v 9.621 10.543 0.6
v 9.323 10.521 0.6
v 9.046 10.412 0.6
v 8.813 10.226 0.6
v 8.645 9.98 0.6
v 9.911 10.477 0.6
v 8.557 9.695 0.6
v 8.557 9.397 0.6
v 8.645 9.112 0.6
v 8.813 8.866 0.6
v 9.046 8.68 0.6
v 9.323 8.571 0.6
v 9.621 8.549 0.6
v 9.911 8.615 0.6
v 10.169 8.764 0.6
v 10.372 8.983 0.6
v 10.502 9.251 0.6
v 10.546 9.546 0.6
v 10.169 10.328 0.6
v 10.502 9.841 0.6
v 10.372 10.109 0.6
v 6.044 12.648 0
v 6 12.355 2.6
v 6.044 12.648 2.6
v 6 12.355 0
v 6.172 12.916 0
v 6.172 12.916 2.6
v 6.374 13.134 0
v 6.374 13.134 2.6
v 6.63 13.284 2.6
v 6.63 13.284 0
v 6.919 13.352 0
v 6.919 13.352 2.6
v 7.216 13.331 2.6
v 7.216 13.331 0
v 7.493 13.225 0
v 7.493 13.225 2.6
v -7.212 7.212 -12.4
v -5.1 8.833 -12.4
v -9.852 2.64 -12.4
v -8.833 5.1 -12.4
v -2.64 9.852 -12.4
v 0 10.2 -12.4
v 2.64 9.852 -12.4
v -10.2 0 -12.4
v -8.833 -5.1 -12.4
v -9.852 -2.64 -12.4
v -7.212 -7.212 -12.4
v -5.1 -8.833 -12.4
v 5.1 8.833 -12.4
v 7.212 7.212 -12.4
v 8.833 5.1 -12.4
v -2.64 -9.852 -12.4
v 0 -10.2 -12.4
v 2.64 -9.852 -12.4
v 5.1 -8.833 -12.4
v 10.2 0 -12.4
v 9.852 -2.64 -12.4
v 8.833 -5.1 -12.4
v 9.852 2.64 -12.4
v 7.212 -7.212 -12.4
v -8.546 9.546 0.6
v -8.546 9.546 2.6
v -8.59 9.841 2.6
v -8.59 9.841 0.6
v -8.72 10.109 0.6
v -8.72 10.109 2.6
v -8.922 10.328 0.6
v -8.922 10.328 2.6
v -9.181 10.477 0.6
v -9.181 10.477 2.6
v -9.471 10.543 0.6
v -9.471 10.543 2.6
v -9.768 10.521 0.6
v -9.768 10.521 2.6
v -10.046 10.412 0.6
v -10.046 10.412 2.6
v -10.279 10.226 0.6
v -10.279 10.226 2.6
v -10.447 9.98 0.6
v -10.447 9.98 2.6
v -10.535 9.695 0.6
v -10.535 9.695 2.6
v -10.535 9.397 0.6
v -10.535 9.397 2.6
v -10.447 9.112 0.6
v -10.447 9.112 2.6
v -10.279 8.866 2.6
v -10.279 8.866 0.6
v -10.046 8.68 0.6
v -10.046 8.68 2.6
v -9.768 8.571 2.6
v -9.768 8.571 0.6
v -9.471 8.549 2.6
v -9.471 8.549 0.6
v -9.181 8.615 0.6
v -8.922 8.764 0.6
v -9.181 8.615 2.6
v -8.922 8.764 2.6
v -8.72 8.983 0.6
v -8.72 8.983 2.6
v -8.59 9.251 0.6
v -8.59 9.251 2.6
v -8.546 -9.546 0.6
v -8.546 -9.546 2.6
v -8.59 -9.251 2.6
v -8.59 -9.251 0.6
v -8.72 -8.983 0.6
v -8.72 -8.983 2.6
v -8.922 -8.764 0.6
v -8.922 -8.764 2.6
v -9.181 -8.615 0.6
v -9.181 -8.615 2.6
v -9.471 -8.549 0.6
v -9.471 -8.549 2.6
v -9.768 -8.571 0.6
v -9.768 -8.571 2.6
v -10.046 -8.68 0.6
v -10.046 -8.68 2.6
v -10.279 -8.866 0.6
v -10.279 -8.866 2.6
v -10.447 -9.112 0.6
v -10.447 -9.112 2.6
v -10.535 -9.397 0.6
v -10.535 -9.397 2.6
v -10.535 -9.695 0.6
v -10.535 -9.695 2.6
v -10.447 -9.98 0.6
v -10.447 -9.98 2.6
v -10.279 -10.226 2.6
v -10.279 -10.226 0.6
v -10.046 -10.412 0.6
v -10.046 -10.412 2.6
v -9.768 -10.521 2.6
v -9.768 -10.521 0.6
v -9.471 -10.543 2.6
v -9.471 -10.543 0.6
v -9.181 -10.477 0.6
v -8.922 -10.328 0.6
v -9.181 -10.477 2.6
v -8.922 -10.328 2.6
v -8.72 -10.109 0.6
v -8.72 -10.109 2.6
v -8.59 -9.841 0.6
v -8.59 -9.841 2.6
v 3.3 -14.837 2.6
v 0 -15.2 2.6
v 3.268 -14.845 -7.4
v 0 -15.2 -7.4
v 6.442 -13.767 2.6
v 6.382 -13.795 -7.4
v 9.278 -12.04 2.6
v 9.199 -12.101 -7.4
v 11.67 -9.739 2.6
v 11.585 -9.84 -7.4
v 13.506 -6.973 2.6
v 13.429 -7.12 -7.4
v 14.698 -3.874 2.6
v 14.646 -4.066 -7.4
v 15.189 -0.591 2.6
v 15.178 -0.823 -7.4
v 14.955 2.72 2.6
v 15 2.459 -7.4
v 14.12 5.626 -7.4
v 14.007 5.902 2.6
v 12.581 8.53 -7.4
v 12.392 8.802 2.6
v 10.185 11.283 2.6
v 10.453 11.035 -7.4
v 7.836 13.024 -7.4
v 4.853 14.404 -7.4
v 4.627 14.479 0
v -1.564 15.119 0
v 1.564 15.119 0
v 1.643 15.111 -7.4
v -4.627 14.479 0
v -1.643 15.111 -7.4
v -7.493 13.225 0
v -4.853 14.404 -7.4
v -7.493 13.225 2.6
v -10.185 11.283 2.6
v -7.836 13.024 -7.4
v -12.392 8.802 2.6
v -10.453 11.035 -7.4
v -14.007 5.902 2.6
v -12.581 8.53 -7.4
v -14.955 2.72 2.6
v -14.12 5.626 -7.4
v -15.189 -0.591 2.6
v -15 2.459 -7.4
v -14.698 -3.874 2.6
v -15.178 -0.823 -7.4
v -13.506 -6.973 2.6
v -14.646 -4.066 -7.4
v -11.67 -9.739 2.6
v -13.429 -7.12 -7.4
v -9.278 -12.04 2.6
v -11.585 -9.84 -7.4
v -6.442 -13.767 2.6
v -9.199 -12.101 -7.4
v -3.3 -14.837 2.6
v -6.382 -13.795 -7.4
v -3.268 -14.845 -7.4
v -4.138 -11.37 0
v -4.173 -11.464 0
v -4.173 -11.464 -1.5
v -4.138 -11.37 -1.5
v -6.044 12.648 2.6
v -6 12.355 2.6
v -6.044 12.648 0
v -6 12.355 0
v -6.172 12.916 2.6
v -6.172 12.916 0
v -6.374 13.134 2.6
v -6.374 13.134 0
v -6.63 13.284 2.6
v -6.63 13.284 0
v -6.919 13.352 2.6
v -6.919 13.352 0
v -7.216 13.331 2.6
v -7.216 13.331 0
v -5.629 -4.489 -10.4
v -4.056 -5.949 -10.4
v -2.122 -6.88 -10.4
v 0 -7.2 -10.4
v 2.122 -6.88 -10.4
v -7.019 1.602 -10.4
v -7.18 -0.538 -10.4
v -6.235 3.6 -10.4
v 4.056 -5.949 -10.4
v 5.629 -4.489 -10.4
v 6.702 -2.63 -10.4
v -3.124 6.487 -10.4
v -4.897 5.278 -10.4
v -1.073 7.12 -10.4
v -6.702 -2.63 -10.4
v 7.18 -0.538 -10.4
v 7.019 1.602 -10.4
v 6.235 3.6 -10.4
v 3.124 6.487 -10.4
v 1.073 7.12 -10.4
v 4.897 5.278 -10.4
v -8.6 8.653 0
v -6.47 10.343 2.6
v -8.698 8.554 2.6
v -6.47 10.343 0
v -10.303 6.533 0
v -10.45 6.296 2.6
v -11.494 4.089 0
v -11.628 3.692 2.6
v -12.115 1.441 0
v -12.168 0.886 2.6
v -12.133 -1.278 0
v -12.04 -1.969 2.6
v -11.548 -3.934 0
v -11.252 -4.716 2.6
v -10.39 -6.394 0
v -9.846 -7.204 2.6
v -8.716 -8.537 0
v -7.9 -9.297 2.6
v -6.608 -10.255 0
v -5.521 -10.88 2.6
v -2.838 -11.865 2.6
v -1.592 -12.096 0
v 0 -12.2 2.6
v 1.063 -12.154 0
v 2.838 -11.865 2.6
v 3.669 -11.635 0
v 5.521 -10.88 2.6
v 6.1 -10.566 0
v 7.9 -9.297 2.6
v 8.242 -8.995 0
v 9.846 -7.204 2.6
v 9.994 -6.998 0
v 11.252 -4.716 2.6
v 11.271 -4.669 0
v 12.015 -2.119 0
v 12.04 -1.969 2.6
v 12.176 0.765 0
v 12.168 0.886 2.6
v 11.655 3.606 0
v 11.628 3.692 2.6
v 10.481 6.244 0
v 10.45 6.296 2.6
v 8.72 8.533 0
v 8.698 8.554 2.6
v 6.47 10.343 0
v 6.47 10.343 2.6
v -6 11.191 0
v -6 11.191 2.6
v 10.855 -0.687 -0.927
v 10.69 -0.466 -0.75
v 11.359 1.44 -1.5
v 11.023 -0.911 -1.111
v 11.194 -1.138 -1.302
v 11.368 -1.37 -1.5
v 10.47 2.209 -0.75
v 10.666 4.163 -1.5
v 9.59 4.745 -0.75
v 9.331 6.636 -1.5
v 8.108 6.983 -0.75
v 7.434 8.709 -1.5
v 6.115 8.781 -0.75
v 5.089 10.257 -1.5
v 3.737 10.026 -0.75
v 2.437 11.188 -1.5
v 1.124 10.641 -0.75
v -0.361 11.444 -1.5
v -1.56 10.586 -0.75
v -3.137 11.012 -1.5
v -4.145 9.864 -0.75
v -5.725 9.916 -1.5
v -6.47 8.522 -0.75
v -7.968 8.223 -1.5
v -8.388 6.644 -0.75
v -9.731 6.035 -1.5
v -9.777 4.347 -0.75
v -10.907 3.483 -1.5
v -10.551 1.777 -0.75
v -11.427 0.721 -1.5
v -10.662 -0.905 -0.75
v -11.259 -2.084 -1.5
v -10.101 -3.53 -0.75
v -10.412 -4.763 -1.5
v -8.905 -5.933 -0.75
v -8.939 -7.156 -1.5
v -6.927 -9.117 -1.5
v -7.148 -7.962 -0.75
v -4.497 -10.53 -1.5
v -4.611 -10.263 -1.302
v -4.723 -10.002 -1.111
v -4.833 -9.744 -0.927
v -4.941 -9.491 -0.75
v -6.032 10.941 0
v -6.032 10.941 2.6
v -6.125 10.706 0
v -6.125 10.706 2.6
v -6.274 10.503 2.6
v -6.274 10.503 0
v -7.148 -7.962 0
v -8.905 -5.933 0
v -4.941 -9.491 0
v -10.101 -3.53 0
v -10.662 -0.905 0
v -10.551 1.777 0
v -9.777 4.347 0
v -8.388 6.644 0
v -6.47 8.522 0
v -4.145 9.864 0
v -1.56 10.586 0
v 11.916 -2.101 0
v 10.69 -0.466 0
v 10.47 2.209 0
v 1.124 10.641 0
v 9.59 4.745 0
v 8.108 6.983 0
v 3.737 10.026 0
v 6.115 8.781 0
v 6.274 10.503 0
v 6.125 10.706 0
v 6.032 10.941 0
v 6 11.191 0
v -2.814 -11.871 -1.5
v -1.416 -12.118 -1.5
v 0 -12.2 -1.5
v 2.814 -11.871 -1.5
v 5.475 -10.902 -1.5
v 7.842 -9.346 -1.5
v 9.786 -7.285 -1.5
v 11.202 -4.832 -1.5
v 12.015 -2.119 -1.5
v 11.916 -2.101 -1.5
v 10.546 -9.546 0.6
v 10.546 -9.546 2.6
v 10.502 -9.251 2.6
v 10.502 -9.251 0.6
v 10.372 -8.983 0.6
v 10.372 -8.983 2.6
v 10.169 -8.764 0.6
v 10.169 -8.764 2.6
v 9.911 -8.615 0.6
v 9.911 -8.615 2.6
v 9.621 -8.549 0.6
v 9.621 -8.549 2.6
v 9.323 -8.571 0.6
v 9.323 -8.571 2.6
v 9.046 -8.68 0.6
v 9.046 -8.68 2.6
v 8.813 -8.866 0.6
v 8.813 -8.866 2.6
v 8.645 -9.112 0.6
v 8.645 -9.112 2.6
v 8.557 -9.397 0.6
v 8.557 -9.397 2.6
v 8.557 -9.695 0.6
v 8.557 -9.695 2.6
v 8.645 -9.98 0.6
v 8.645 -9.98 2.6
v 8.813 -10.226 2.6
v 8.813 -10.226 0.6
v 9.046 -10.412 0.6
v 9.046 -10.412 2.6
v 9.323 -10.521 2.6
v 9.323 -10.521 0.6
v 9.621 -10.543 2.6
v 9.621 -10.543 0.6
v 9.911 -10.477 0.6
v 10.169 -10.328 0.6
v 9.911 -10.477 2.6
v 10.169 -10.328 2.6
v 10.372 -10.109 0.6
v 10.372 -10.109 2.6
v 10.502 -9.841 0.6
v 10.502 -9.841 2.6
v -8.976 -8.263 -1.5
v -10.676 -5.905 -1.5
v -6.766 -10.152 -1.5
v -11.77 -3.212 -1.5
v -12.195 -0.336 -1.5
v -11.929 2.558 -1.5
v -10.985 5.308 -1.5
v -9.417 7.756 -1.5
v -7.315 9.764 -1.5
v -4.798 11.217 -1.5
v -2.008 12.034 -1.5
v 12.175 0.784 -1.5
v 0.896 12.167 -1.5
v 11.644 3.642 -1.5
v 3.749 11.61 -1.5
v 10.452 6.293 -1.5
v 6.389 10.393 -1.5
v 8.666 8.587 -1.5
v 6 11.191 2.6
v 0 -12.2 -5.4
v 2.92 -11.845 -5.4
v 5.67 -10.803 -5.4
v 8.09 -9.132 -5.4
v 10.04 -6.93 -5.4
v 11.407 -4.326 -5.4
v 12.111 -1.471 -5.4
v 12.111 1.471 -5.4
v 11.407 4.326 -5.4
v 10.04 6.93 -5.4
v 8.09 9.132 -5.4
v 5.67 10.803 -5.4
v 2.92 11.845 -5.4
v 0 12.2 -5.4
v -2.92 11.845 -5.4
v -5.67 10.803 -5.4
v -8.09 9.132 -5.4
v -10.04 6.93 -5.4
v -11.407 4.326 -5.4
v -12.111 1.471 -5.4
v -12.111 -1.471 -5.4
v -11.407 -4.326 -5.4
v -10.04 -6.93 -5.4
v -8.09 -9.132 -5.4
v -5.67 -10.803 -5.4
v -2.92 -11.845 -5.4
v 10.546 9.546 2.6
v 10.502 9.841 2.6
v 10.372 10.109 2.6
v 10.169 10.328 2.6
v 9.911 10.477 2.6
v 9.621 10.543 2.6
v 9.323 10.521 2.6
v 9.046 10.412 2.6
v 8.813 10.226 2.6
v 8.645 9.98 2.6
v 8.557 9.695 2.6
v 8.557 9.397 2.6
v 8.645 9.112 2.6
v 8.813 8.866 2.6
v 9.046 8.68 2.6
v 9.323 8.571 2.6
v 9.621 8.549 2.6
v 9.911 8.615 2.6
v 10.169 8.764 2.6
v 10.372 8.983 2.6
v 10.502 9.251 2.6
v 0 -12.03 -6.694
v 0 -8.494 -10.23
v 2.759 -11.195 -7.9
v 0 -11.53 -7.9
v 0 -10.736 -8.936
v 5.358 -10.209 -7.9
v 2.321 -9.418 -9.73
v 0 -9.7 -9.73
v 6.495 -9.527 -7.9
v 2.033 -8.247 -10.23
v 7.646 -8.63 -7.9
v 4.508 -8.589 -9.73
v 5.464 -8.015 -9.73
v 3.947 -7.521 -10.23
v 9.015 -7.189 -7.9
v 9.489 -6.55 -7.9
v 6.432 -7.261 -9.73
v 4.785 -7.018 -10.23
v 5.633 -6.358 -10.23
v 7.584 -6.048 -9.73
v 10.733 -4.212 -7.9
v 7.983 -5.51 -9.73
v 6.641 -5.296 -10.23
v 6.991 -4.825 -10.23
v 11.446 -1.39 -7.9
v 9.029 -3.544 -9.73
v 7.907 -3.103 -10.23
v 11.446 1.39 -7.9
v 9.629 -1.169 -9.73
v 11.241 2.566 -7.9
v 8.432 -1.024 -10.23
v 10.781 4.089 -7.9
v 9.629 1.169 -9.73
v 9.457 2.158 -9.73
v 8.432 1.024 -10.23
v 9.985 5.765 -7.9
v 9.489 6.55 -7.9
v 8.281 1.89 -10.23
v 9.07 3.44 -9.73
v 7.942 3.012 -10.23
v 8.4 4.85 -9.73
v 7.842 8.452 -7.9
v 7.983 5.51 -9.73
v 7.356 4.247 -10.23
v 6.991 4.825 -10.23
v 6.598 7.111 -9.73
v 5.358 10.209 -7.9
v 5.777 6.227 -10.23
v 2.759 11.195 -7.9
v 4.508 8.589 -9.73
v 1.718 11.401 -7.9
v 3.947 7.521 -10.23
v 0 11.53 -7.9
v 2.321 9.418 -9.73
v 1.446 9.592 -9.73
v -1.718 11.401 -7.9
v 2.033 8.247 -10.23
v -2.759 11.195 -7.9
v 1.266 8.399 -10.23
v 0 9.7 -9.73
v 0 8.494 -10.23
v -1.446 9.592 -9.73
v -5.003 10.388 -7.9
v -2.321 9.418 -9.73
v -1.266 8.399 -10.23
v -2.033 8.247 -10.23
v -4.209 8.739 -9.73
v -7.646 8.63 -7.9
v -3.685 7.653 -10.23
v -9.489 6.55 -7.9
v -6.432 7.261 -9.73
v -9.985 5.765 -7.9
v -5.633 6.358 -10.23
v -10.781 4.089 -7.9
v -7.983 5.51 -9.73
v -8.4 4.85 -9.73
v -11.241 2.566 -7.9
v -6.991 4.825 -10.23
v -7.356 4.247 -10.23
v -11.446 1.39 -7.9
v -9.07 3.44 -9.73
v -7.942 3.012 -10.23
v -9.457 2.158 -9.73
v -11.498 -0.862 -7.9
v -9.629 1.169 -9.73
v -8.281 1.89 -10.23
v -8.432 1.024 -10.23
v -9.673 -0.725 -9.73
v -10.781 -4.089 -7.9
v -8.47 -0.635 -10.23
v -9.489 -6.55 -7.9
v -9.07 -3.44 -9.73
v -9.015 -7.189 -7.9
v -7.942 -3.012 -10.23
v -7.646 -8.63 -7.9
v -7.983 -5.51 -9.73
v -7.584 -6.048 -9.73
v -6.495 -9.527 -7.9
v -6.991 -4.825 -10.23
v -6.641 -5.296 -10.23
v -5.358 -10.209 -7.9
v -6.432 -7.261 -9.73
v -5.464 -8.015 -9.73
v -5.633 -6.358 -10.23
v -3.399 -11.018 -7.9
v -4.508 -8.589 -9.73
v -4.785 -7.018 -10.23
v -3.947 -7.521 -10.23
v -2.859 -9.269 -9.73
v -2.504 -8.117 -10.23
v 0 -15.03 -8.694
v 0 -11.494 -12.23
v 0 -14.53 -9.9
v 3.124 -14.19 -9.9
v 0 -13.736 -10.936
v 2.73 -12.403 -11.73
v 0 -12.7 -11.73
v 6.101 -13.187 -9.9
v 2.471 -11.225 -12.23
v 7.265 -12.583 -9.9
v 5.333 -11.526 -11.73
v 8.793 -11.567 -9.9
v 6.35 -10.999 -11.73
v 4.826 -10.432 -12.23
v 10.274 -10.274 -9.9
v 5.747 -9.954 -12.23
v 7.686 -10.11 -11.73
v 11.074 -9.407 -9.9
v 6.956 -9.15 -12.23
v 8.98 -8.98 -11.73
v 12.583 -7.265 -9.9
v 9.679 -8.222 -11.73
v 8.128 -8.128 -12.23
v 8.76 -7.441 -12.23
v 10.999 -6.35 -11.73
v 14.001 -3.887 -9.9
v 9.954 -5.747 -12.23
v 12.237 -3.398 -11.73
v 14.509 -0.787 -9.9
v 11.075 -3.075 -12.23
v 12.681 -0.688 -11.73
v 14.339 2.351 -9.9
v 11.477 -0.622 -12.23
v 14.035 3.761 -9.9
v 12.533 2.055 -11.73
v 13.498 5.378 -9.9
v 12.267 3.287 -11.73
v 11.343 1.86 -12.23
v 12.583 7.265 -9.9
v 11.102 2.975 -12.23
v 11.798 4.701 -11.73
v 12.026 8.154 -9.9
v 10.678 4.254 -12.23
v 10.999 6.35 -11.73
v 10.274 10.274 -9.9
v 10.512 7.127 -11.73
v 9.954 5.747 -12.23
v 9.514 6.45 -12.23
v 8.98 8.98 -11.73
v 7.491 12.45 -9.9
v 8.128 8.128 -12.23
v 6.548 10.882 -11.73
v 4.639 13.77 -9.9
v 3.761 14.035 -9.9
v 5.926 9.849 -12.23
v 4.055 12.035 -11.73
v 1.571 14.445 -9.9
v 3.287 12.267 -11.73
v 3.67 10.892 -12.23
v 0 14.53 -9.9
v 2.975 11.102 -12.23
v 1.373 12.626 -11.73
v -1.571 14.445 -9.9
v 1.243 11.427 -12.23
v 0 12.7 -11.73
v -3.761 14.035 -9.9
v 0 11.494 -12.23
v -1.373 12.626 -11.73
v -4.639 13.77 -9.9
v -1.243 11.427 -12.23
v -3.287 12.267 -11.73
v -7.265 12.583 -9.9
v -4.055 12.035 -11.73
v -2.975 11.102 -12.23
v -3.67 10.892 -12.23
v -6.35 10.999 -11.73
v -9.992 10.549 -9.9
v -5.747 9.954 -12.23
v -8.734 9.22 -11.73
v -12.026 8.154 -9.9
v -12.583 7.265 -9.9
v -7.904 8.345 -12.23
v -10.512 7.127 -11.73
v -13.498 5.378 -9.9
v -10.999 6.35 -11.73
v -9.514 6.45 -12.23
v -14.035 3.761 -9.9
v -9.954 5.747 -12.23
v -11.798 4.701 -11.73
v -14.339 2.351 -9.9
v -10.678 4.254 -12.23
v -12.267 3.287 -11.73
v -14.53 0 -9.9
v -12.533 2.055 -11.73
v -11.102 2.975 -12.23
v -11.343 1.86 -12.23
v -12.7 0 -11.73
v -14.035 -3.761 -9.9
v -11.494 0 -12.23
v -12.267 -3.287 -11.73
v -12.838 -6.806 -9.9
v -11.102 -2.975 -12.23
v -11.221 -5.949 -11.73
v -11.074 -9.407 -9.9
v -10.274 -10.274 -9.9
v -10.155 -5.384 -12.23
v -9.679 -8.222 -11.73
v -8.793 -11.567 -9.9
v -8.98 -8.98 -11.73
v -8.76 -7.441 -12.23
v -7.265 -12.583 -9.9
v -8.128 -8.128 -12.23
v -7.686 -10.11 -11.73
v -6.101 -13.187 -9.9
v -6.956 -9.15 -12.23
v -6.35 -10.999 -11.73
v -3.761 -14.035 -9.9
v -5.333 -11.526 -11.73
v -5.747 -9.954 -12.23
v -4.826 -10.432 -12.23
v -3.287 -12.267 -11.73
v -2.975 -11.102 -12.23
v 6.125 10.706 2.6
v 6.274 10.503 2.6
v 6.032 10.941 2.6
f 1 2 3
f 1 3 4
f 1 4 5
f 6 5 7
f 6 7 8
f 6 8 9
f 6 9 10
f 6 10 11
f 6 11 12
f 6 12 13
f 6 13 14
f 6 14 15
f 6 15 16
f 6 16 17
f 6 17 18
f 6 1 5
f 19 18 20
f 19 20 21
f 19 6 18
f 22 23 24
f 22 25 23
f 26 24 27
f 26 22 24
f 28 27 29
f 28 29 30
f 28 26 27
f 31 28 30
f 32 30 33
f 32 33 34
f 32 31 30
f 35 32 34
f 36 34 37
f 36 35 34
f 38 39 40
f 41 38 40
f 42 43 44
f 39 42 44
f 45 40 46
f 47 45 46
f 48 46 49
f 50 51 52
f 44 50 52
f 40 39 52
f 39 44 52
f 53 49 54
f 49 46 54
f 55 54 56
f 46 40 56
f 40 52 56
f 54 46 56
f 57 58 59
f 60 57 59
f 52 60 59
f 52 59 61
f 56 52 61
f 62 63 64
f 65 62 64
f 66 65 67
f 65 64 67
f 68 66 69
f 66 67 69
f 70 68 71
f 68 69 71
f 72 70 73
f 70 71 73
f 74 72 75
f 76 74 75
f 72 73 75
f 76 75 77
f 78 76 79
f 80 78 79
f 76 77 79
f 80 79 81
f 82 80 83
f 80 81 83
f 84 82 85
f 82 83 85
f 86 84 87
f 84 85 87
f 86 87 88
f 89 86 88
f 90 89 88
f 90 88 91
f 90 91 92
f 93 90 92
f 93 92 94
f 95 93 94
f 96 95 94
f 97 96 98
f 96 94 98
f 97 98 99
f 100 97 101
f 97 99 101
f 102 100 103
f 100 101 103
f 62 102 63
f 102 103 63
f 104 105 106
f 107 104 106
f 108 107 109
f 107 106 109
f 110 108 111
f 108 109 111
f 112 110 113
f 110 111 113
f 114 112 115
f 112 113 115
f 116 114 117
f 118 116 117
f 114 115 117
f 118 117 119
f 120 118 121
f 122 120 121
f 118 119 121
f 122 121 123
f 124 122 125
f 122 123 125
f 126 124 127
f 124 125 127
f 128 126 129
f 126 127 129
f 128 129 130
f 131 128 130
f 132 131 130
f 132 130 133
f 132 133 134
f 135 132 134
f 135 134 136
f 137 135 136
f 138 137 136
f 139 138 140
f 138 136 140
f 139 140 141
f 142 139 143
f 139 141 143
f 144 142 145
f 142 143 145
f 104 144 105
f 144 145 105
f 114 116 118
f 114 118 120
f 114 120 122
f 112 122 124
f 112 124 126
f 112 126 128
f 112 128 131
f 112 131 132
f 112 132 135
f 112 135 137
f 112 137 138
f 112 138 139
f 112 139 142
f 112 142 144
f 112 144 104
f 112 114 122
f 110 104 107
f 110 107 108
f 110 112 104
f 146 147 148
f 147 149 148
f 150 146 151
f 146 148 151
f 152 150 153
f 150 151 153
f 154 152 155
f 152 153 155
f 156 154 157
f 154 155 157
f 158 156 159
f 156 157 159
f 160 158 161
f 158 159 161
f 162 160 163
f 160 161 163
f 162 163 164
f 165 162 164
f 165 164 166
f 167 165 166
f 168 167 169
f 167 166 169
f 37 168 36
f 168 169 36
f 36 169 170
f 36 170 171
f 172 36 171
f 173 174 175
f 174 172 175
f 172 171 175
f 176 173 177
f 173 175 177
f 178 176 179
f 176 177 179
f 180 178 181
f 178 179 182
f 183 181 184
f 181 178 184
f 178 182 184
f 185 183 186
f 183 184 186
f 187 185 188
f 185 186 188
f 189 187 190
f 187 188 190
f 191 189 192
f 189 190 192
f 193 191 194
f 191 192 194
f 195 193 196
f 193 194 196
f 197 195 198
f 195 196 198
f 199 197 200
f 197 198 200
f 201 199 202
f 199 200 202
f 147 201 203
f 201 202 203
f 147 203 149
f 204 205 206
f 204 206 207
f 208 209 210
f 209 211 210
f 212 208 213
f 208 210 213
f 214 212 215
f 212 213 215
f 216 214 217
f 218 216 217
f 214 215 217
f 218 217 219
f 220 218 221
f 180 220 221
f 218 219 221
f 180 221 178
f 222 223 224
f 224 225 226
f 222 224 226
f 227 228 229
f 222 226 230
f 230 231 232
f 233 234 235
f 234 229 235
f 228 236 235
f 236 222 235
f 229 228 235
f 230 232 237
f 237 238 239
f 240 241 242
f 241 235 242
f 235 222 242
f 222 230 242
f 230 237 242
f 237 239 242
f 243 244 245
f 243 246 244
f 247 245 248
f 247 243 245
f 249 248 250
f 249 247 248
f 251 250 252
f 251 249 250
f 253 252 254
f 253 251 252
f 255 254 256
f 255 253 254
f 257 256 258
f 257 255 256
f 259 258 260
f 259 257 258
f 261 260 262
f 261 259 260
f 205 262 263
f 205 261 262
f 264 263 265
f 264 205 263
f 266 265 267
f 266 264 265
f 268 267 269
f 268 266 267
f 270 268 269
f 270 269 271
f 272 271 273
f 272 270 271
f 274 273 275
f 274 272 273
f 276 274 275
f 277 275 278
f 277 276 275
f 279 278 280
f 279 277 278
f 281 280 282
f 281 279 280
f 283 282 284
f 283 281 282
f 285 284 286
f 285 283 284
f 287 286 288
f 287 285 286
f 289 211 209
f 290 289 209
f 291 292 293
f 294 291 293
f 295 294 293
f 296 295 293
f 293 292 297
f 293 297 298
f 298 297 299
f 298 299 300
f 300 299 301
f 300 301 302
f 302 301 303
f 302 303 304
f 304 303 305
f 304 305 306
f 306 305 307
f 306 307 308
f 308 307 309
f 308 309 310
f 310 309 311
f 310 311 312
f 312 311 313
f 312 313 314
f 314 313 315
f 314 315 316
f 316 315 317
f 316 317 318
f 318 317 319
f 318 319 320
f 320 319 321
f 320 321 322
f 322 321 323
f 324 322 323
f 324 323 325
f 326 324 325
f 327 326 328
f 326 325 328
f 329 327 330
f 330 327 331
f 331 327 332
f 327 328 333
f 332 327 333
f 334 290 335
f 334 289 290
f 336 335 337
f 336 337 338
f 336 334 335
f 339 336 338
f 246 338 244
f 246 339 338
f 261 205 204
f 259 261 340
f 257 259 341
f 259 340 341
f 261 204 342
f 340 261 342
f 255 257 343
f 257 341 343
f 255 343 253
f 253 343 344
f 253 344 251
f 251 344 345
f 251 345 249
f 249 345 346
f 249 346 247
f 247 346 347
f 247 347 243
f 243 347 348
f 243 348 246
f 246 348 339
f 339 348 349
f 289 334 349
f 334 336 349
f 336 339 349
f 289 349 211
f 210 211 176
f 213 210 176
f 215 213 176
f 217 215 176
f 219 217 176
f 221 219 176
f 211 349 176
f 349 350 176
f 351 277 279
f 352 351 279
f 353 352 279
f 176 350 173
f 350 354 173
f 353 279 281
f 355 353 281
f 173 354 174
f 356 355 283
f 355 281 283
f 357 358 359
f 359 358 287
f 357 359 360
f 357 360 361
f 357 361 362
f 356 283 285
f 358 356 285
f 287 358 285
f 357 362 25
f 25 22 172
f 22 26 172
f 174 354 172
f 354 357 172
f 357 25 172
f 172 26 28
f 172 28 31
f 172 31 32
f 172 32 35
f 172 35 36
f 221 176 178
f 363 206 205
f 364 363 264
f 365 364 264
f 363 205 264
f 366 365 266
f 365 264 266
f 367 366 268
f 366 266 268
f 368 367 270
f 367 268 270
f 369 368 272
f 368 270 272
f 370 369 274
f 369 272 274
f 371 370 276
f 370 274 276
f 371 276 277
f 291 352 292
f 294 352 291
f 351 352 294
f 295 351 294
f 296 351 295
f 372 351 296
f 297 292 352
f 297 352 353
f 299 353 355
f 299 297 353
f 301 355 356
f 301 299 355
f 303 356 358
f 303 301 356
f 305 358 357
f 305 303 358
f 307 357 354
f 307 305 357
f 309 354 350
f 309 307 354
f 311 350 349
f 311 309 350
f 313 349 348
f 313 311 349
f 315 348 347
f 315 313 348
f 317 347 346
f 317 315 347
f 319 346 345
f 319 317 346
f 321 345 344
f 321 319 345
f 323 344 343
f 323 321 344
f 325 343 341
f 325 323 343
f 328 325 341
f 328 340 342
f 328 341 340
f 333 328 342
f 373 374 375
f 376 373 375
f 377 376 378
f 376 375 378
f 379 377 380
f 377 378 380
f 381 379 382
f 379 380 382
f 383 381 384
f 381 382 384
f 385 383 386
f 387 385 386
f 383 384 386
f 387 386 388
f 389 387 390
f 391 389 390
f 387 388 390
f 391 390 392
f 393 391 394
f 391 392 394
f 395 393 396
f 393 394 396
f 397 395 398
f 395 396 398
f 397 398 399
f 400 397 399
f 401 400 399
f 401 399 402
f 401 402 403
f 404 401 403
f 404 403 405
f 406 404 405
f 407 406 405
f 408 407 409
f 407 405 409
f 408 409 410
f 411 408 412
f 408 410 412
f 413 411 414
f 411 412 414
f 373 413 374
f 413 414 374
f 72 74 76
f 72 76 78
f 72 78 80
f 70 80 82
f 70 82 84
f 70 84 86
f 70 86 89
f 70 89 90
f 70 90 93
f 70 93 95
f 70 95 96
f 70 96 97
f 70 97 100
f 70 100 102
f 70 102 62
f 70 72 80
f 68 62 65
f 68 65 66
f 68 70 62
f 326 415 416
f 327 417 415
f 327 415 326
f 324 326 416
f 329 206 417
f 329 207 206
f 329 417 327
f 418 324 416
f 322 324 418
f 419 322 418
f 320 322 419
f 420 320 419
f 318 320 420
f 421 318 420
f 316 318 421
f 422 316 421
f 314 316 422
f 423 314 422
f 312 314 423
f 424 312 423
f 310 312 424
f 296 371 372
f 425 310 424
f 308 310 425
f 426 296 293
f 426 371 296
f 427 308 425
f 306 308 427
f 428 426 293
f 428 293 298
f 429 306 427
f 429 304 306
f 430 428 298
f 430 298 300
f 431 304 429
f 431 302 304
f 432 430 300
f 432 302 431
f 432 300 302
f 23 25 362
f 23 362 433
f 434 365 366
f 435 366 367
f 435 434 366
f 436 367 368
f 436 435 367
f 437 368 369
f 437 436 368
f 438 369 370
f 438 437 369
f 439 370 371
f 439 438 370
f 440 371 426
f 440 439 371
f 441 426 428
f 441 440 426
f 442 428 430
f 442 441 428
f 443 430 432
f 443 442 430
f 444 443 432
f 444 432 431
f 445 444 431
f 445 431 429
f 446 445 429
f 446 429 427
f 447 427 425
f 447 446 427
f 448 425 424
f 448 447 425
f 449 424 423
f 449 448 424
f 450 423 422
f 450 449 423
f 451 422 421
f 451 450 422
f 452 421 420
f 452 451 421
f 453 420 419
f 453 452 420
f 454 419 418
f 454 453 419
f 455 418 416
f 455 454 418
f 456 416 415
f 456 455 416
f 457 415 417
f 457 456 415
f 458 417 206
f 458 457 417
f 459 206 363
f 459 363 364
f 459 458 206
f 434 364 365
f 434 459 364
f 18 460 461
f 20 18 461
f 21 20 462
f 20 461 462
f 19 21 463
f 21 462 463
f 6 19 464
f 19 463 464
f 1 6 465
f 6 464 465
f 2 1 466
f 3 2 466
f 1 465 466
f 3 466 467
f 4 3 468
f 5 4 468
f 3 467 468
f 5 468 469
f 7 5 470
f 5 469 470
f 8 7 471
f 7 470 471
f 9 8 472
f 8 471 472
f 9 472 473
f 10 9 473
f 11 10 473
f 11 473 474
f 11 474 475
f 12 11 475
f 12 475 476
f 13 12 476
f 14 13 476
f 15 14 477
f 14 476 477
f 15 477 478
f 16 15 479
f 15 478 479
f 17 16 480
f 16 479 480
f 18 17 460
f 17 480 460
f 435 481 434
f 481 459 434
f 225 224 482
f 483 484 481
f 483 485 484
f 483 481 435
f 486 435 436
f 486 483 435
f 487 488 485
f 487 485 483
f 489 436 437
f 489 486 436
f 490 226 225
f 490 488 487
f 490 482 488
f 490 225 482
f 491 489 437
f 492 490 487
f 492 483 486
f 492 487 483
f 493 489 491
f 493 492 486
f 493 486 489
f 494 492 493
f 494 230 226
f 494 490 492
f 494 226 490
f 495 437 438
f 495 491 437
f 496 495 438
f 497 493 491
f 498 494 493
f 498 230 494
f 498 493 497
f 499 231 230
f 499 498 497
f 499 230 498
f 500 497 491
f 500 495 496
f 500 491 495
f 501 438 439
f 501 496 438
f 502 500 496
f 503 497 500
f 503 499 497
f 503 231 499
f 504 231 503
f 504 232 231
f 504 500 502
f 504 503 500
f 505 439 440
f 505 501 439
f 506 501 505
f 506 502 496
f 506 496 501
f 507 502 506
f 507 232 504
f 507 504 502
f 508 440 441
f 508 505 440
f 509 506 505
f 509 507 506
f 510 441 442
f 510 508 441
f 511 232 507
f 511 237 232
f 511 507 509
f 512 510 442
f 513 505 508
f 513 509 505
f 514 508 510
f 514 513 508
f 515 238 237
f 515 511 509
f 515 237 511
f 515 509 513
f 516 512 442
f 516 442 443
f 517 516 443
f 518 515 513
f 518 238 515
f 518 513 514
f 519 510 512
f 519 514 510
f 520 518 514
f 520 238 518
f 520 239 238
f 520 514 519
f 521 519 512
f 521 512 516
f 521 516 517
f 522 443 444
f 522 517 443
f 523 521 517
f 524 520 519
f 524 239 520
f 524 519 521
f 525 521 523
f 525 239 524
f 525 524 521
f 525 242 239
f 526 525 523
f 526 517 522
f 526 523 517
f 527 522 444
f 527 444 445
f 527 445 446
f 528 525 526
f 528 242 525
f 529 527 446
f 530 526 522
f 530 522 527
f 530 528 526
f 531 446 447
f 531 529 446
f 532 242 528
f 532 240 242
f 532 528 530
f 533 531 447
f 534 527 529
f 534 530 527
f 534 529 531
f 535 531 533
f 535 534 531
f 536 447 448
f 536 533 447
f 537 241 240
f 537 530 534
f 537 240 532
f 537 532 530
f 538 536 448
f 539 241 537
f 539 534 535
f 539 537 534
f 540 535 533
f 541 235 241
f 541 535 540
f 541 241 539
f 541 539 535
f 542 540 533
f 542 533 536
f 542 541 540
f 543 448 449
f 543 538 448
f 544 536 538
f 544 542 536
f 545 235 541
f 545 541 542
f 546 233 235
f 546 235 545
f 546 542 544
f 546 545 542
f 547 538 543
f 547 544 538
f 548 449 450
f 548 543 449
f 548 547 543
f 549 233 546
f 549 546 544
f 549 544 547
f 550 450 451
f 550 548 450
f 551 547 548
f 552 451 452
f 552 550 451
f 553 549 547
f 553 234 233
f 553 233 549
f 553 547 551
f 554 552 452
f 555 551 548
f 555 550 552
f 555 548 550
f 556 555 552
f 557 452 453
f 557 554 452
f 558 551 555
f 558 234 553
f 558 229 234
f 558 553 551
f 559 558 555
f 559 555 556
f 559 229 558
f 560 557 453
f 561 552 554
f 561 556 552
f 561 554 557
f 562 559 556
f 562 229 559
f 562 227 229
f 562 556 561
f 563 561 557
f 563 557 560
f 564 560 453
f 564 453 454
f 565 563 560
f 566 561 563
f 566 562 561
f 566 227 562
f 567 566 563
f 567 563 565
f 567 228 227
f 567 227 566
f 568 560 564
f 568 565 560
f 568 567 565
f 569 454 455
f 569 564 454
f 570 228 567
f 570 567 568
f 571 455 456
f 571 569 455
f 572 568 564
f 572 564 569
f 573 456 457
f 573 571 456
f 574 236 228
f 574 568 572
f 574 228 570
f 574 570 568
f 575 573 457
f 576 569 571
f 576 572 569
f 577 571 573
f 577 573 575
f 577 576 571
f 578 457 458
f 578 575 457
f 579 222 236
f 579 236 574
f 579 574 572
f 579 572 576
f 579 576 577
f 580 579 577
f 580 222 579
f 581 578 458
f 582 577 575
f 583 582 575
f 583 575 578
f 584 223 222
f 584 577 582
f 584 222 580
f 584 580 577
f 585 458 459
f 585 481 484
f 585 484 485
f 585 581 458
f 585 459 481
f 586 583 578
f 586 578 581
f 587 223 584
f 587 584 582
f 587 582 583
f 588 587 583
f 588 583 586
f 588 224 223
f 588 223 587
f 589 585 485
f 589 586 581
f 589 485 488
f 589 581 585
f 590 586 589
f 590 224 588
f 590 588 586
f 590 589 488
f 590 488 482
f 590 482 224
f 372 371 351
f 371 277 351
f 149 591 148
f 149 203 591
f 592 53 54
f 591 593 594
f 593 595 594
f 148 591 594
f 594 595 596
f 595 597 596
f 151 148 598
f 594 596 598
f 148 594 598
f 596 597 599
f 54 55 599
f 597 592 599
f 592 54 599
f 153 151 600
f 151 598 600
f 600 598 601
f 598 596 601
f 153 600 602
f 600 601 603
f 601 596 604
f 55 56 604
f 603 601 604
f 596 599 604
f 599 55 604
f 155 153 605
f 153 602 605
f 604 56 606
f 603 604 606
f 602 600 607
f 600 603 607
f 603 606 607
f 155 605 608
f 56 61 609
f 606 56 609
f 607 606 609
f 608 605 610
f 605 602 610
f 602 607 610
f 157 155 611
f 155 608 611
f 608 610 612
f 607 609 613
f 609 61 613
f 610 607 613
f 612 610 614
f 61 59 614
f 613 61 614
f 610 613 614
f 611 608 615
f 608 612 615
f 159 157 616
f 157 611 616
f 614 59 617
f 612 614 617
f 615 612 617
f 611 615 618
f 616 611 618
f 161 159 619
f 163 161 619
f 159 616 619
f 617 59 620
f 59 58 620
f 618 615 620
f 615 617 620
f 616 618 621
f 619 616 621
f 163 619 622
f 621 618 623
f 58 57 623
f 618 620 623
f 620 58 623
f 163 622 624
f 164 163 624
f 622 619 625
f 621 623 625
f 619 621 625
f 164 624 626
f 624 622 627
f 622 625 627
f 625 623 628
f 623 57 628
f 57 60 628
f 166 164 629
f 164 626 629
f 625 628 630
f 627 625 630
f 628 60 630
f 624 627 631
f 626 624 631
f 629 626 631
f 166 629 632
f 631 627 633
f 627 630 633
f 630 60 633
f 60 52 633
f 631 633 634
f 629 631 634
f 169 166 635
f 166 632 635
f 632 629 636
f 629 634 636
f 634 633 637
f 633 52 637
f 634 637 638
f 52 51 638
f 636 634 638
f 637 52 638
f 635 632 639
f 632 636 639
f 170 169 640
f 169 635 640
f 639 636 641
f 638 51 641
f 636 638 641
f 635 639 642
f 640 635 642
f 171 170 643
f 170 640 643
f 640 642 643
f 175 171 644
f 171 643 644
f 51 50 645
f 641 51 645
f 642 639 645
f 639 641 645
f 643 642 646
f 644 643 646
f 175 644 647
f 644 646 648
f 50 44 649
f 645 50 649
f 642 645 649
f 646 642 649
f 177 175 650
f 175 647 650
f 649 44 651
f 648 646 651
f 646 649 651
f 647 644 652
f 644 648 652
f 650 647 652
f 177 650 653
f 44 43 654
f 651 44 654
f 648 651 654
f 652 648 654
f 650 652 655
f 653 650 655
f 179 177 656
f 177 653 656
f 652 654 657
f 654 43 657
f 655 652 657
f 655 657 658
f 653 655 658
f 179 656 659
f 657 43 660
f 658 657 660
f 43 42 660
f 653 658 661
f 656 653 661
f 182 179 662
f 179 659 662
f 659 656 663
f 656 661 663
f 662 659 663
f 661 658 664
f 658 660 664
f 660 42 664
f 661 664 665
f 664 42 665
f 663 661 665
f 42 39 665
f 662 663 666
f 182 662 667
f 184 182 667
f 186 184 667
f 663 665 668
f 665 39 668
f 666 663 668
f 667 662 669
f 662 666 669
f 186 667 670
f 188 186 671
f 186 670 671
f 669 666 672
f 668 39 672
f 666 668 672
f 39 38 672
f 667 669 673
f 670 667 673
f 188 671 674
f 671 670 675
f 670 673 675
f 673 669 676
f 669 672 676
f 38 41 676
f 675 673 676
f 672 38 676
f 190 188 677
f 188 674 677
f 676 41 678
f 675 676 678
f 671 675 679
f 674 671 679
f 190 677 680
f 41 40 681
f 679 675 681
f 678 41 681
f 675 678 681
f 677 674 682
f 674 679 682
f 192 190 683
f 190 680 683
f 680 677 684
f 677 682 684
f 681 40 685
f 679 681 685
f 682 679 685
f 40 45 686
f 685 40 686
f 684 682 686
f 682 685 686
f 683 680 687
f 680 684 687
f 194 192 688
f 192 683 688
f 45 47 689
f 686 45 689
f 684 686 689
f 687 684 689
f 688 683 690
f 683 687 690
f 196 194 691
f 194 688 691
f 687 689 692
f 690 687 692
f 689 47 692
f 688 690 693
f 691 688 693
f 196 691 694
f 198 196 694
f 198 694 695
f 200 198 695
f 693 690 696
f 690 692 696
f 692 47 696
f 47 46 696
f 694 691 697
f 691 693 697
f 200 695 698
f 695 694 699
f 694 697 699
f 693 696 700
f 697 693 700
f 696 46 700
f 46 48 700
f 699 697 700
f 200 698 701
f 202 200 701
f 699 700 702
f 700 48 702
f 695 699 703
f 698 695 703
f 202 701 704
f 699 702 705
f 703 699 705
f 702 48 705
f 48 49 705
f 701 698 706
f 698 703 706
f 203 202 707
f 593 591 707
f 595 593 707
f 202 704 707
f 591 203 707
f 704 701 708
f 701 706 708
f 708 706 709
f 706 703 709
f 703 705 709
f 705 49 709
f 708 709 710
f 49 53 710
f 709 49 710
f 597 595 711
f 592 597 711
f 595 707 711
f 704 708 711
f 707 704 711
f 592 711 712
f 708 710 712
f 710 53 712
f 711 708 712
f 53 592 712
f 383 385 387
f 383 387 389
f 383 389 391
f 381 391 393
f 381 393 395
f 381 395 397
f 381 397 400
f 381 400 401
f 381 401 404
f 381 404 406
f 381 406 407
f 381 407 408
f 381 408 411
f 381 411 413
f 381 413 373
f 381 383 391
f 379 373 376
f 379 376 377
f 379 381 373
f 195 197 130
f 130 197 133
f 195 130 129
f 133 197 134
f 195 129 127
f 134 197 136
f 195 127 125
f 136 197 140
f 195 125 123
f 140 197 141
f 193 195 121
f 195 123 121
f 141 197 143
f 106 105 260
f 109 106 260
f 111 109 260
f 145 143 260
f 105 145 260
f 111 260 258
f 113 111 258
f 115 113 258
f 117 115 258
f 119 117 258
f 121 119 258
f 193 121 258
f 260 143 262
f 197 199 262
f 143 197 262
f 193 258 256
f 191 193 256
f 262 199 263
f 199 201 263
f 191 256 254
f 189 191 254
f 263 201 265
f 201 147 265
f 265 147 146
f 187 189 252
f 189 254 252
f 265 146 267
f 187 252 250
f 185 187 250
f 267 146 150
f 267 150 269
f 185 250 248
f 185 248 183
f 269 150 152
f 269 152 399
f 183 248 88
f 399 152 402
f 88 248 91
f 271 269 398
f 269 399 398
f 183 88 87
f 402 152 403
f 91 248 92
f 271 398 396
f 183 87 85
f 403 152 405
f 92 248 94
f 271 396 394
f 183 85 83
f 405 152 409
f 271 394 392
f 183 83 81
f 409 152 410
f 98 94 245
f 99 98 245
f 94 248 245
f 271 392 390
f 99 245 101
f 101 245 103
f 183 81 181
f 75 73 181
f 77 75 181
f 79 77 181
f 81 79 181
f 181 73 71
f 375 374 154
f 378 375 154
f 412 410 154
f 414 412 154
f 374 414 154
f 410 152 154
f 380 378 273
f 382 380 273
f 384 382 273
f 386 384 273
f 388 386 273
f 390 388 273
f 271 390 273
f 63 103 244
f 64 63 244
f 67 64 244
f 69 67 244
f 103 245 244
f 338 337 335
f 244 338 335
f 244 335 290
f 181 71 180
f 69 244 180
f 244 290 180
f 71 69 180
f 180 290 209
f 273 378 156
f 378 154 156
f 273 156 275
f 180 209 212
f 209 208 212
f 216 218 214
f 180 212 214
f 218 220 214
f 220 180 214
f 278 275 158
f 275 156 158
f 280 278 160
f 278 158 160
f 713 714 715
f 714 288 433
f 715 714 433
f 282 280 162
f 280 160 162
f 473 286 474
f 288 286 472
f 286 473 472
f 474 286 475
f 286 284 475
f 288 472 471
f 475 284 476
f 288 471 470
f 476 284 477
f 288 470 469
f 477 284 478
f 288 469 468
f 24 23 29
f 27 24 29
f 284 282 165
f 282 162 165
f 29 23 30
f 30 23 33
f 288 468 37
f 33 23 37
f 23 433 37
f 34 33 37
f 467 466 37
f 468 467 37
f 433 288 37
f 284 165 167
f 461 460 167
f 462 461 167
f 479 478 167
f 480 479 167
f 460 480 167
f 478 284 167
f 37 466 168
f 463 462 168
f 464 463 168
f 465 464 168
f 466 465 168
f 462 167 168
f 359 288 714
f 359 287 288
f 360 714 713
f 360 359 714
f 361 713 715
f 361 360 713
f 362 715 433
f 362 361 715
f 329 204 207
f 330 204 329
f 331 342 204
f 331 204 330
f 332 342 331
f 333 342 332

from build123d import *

# Parameters (mm, degrees)
SKETCH002_W     = 12
SKETCH002_H     = 2.6
POCKET_DEPTH    = 7
POCKET001_DEPTH = 1.5
FILLET_R        = 1
CHAMFER_SIZE    = 0.75
CHAMFER001_SIZE = 1.4
SKETCH013_R     = 1
POCKET007_DEPTH = 2


with BuildPart() as part:
    # Sketch → Revolution (revolve)
    with BuildSketch(Plane.YZ):
        with BuildLine():
            Line((-12.2, 2.6), (-15.2, 2.6))
            Line((-15.2, 2.6), (-15.2, -7.4))
            ThreePointArc((-15.2, -7.4), (-13.735534, -10.935534), (-10.2, -12.4))
            Line((-10.2, -12.4), (0, -12.4))
            Line((0, -12.4), (0, -10.4))
            Line((0, -10.4), (-7.2, -10.4))
            ThreePointArc((-12.2, -5.4), (-10.735534, -8.935534), (-7.2, -10.4))
            Line((-12.2, -1.5), (-12.2, -5.4))
            Line((-10.7, -1.5), (-12.2, -1.5))
            Line((-10.7, 0), (-10.7, -1.5))
            Line((-10.7, 0), (-12.2, 0))
            Line((-12.2, 2.6), (-12.2, 0))
        make_face()
    revolve(axis=Axis((0, 0, 0), (0, 0, 1)))

    # Sketch002 (on DatumPlane) → Pocket (cut)
    with BuildSketch(Plane(origin=(0, 15.2, 0), x_dir=(-1, 0, 0), z_dir=(0, 1, 0))):
        with Locations((0, 1.3)):
            Rectangle(SKETCH002_W, SKETCH002_H)
    extrude(amount=-POCKET_DEPTH, mode=Mode.SUBTRACT)

    # Sketch003 → Pocket001 (cut)
    with BuildSketch(Plane.XY):
        with BuildLine():
            ThreePointArc((-4.172646, -11.46425), (6.1, -10.56551), (12.014655, -2.118508))
            Line((12.014655, -2.118508), (10.537443, -1.858036))
            ThreePointArc((-3.659616, -10.054711), (5.35, -9.266472), (10.537443, -1.858036))
            Line((-4.172646, -11.46425), (-3.659616, -10.054711))
        make_face()
    extrude(amount=-POCKET001_DEPTH, mode=Mode.SUBTRACT)

    # Fillet
    fillet_edges = [part.edges().sort_by_distance(p)[0] for p in [
        (6, 10.622617, 1.3),
        (6, 13.965672, 1.3),
        (-6, 10.622617, 1.3),
        (-6, 13.965672, 1.3),
    ]]
    fillet(fillet_edges, radius=FILLET_R)

    # Chamfer
    chamfer_edges = [part.edges().sort_by_distance(p)[0] for p in [
        (-5.35, 9.266472, -1.5),
    ]]
    chamfer(chamfer_edges, length=CHAMFER_SIZE)

    # Chamfer001
    chamfer001_edges = [part.edges().sort_by_distance(p)[0] for p in [
        (-3.659616, -10.054711, -0.375),
        (10.537443, -1.858036, -0.375),
    ]]
    chamfer(chamfer001_edges, length=CHAMFER001_SIZE)

    # Sketch013 → Pocket007 (cut)
    with BuildSketch(Plane.XY.offset(2.6)):
        with Locations((9.545942, 9.545942)):
            Circle(SKETCH013_R)
        with Locations((-9.545942, 9.545942)):
            Circle(SKETCH013_R)
        with Locations((-9.545942, -9.545942)):
            Circle(SKETCH013_R)
        with Locations((9.545942, -9.545942)):
            Circle(SKETCH013_R)
    extrude(amount=-POCKET007_DEPTH, mode=Mode.SUBTRACT)


solid = part.part
